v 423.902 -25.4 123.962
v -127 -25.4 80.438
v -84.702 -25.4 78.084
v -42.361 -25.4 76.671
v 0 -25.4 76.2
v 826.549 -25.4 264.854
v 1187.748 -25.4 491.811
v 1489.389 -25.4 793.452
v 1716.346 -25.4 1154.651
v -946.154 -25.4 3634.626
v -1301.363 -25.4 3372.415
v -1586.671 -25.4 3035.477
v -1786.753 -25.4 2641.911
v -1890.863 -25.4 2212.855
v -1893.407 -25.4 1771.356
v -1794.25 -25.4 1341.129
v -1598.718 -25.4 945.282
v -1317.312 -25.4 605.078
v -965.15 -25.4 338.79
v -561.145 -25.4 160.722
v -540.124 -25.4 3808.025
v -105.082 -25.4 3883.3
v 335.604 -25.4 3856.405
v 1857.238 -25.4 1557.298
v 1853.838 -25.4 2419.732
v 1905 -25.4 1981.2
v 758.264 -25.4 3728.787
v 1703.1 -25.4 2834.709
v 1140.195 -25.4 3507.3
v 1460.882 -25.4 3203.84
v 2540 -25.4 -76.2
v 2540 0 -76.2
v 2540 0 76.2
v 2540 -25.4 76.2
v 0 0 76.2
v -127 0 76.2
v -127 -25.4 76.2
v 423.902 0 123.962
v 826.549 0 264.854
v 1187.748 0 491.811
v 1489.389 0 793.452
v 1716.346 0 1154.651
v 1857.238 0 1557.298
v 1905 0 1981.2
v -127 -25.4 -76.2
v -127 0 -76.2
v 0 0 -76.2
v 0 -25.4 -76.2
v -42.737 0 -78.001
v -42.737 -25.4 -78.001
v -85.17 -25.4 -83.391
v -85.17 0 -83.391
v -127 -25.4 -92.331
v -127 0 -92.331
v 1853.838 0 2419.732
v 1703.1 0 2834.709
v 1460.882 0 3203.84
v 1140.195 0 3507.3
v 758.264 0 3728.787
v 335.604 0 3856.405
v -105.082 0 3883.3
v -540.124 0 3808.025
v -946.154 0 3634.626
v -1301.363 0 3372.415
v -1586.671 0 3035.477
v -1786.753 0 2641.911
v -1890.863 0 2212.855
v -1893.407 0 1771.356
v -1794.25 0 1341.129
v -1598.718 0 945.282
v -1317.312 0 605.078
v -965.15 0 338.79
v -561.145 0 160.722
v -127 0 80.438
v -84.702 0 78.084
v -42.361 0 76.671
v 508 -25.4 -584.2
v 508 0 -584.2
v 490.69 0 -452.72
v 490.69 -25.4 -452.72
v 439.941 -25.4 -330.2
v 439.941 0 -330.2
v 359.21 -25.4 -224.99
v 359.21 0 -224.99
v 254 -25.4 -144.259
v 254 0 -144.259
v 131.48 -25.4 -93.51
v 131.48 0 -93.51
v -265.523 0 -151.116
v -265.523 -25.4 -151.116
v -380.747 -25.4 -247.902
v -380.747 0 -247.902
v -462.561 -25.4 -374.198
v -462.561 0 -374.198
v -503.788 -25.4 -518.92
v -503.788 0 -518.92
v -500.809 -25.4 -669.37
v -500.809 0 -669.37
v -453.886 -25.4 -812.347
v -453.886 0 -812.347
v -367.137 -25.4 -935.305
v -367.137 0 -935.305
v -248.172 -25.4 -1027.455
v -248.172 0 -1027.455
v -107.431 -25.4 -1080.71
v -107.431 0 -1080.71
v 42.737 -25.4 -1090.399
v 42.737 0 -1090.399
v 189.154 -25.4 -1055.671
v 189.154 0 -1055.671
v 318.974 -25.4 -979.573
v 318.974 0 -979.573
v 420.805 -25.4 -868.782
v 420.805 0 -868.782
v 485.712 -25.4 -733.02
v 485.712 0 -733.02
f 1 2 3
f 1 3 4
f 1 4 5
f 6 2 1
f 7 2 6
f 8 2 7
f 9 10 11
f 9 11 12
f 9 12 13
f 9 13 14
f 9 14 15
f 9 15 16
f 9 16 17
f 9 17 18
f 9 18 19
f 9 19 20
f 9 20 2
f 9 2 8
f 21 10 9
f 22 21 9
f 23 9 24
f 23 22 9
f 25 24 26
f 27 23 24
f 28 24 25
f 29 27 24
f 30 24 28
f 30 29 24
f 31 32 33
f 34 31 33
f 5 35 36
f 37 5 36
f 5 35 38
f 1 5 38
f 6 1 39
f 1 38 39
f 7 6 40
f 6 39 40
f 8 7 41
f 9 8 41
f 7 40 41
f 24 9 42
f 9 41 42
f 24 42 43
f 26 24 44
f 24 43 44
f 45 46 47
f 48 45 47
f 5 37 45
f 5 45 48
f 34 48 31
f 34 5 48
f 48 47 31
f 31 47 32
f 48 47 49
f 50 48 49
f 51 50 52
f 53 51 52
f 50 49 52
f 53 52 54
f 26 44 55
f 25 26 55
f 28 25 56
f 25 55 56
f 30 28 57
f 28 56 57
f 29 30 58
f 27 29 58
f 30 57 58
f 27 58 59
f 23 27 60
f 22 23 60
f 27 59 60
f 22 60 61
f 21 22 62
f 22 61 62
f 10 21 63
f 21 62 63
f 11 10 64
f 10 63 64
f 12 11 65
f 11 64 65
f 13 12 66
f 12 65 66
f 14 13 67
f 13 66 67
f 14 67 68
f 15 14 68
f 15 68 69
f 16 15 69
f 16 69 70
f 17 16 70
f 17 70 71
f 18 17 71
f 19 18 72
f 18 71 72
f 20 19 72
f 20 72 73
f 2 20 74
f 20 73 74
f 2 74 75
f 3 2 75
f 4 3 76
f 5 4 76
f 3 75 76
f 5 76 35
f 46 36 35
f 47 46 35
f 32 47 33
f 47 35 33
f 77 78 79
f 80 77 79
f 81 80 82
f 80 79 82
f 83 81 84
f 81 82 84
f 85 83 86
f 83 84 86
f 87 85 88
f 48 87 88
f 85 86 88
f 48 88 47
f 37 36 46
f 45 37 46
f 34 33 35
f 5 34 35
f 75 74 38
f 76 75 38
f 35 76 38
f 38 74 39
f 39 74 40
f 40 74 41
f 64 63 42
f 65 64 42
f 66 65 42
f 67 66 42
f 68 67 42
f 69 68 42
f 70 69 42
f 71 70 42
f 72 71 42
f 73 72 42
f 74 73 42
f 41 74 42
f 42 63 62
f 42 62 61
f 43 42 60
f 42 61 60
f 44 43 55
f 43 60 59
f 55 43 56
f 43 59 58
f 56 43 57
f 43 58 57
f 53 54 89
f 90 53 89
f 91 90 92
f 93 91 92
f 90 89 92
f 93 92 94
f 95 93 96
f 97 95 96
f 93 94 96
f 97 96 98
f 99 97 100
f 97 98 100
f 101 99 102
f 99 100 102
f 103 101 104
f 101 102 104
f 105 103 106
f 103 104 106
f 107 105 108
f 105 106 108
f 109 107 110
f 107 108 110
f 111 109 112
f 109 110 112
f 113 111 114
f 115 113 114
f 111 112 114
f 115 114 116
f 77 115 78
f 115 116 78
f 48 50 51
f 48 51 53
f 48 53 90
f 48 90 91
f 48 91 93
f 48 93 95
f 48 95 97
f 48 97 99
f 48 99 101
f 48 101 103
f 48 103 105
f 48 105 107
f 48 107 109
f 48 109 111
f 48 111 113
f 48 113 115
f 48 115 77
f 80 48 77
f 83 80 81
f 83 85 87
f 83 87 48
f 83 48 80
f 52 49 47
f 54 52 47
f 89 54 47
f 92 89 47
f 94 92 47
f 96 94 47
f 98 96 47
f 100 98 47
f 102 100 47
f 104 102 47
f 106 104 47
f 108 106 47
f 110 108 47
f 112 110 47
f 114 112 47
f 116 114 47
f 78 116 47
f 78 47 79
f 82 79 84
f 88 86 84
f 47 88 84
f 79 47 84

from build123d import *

# Parameters (mm, degrees)
F1_DEPTH = 25.4


with BuildPart() as f1:
    # F0 (on Front) → F1 (new body)
    with BuildSketch(Plane.XZ):
        with BuildLine():
            ThreePointArc((-3e-06, 76.2), (1347.038417, 634.161581), (1905, 1981.2))
            ThreePointArc((1905, 1981.2), (-1301.362747, 3372.415296), (-127, 80.438048))
            ThreePointArc((-127, 80.438048), (-63.535348, 77.259807), (-3e-06, 76.2))
        make_face()
        Polygon((2540, 76.2), (-3e-06, 76.2), (-127, 76.2), (-127, -76.2), (1e-06, -76.2), (2540, -76.2), align=None)
        with BuildLine():
            ThreePointArc((508, -584.2), (359.210245, -224.989755), (1e-06, -76.2))
            ThreePointArc((1e-06, -76.2), (-64.01018, -80.248914), (-127, -92.331115))
            ThreePointArc((-127, -92.331115), (-311.085197, -985.809263), (508, -584.2))
        make_face()
    extrude(amount=F1_DEPTH)


solid = f1.part
